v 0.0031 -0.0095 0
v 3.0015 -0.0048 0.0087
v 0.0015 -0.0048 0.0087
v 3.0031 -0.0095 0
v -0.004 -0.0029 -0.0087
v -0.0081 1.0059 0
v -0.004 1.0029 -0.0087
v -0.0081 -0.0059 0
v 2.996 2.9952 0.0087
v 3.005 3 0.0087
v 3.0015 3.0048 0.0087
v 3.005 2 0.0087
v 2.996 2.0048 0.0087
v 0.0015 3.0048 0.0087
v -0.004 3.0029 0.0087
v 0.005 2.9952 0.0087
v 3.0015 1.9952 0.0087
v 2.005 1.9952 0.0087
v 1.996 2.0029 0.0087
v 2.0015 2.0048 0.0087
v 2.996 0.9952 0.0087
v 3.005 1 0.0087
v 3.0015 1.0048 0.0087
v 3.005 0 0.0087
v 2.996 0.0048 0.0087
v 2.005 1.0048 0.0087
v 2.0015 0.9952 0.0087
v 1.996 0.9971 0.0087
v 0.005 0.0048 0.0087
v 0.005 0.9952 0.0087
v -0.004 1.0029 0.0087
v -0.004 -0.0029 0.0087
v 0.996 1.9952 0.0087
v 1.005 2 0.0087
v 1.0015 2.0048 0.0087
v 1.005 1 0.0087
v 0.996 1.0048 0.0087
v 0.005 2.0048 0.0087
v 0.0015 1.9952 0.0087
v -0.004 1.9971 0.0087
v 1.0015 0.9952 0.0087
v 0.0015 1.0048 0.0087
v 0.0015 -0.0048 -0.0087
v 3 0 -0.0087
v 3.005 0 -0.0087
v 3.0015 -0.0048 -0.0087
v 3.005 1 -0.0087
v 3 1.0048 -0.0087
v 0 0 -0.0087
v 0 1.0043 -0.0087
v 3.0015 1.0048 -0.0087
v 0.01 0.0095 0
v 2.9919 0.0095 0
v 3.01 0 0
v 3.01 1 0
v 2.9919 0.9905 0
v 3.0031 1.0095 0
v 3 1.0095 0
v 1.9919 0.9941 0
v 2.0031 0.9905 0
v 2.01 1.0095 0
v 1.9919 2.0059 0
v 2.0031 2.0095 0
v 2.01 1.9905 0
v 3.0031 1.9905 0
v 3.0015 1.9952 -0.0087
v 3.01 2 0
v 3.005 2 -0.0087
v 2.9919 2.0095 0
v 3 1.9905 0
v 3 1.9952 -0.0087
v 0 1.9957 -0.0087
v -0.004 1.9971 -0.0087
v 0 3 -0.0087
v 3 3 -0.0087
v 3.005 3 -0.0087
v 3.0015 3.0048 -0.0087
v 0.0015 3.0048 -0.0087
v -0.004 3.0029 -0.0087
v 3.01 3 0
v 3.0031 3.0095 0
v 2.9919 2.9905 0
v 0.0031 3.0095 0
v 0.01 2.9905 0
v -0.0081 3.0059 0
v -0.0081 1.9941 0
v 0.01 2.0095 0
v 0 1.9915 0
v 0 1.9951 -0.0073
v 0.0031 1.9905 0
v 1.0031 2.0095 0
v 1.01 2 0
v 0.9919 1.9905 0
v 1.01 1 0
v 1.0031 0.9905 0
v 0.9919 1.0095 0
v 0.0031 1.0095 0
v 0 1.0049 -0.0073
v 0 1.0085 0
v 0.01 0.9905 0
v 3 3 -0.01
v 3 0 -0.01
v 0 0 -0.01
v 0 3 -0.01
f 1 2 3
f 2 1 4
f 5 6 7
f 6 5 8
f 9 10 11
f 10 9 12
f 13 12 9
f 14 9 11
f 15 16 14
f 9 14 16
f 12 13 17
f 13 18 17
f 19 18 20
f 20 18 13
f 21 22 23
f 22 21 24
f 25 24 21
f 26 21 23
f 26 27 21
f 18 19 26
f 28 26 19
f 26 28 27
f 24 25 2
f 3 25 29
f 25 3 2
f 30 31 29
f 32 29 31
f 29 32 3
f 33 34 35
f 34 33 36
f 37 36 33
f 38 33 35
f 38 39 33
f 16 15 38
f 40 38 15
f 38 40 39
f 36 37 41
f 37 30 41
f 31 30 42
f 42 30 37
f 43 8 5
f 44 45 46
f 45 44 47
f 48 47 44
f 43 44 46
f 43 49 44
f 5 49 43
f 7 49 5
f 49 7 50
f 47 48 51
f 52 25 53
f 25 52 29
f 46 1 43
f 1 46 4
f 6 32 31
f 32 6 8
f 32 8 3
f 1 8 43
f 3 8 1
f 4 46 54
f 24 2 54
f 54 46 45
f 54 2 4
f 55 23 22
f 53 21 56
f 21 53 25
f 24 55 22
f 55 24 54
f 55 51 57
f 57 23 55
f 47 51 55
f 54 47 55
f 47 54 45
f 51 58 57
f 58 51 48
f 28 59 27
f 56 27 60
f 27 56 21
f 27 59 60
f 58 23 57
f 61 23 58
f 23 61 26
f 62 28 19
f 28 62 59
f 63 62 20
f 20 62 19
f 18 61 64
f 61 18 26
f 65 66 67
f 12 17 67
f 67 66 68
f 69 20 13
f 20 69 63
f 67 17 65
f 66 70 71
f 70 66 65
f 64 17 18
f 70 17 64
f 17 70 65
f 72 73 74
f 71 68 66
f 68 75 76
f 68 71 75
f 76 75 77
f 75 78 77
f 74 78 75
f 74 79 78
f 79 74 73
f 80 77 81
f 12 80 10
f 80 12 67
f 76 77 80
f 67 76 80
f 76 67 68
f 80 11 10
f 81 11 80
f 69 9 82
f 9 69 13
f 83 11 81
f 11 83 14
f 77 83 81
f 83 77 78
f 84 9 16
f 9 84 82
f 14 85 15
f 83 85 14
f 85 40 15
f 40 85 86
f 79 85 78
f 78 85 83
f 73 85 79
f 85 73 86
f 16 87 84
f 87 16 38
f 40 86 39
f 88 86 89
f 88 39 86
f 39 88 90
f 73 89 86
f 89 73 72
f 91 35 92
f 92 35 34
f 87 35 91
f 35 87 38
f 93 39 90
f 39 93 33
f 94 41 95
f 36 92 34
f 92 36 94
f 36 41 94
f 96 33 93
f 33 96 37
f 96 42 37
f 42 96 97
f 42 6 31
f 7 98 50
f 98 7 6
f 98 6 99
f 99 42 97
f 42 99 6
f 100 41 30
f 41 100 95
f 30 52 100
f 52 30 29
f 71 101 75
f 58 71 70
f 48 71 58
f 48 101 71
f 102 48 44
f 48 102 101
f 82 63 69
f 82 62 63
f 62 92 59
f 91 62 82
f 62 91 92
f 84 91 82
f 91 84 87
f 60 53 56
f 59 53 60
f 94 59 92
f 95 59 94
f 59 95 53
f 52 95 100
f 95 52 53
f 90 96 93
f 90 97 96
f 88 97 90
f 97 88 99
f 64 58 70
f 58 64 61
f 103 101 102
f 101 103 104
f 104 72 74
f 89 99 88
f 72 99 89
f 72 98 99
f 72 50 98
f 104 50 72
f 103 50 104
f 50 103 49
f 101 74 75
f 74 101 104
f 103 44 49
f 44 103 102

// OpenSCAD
hull(){
    translate([0.0, 0.0]) sphere(0.01);
    translate([1.0, 0.0]) sphere(0.01);
}
hull(){
    translate([1.0, 0.0]) sphere(0.01);
    translate([2.0, 0.0]) sphere(0.01);
}
hull(){
    translate([2.0, 0.0]) sphere(0.01);
    translate([3.0, 0.0]) sphere(0.01);
}
hull(){
    translate([3.0, 0.0]) sphere(0.01);
    translate([3.0, 1.0]) sphere(0.01);
}
hull(){
    translate([3.0, 1.0]) sphere(0.01);
    translate([2.0, 1.0]) sphere(0.01);
}
hull(){
    translate([2.0, 1.0]) sphere(0.01);
    translate([2.0, 2.0]) sphere(0.01);
}
hull(){
    translate([2.0, 2.0]) sphere(0.01);
    translate([3.0, 2.0]) sphere(0.01);
}
hull(){
    translate([3.0, 2.0]) sphere(0.01);
    translate([3.0, 3.0]) sphere(0.01);
}
hull(){
    translate([3.0, 3.0]) sphere(0.01);
    translate([2.0, 3.0]) sphere(0.01);
}
hull(){
    translate([2.0, 3.0]) sphere(0.01);
    translate([1.0, 3.0]) sphere(0.01);
}
hull(){
    translate([1.0, 3.0]) sphere(0.01);
    translate([0.0, 3.0]) sphere(0.01);
}
hull(){
    translate([0.0, 3.0]) sphere(0.01);
    translate([0.0, 2.0]) sphere(0.01);
}
hull(){
    translate([0.0, 2.0]) sphere(0.01);
    translate([1.0, 2.0]) sphere(0.01);
}
hull(){
    translate([1.0, 2.0]) sphere(0.01);
    translate([1.0, 1.0]) sphere(0.01);
}
hull(){
    translate([1.0, 1.0]) sphere(0.01);
    translate([0.0, 1.0]) sphere(0.01);
}
hull(){
    translate([0.0, 1.0]) sphere(0.01);
    translate([0.0, 0.0]) sphere(0.01);
}
translate([0,0,-0.01]) color([0.1,0.1,0.1]) cube([3,3,0.01]);
